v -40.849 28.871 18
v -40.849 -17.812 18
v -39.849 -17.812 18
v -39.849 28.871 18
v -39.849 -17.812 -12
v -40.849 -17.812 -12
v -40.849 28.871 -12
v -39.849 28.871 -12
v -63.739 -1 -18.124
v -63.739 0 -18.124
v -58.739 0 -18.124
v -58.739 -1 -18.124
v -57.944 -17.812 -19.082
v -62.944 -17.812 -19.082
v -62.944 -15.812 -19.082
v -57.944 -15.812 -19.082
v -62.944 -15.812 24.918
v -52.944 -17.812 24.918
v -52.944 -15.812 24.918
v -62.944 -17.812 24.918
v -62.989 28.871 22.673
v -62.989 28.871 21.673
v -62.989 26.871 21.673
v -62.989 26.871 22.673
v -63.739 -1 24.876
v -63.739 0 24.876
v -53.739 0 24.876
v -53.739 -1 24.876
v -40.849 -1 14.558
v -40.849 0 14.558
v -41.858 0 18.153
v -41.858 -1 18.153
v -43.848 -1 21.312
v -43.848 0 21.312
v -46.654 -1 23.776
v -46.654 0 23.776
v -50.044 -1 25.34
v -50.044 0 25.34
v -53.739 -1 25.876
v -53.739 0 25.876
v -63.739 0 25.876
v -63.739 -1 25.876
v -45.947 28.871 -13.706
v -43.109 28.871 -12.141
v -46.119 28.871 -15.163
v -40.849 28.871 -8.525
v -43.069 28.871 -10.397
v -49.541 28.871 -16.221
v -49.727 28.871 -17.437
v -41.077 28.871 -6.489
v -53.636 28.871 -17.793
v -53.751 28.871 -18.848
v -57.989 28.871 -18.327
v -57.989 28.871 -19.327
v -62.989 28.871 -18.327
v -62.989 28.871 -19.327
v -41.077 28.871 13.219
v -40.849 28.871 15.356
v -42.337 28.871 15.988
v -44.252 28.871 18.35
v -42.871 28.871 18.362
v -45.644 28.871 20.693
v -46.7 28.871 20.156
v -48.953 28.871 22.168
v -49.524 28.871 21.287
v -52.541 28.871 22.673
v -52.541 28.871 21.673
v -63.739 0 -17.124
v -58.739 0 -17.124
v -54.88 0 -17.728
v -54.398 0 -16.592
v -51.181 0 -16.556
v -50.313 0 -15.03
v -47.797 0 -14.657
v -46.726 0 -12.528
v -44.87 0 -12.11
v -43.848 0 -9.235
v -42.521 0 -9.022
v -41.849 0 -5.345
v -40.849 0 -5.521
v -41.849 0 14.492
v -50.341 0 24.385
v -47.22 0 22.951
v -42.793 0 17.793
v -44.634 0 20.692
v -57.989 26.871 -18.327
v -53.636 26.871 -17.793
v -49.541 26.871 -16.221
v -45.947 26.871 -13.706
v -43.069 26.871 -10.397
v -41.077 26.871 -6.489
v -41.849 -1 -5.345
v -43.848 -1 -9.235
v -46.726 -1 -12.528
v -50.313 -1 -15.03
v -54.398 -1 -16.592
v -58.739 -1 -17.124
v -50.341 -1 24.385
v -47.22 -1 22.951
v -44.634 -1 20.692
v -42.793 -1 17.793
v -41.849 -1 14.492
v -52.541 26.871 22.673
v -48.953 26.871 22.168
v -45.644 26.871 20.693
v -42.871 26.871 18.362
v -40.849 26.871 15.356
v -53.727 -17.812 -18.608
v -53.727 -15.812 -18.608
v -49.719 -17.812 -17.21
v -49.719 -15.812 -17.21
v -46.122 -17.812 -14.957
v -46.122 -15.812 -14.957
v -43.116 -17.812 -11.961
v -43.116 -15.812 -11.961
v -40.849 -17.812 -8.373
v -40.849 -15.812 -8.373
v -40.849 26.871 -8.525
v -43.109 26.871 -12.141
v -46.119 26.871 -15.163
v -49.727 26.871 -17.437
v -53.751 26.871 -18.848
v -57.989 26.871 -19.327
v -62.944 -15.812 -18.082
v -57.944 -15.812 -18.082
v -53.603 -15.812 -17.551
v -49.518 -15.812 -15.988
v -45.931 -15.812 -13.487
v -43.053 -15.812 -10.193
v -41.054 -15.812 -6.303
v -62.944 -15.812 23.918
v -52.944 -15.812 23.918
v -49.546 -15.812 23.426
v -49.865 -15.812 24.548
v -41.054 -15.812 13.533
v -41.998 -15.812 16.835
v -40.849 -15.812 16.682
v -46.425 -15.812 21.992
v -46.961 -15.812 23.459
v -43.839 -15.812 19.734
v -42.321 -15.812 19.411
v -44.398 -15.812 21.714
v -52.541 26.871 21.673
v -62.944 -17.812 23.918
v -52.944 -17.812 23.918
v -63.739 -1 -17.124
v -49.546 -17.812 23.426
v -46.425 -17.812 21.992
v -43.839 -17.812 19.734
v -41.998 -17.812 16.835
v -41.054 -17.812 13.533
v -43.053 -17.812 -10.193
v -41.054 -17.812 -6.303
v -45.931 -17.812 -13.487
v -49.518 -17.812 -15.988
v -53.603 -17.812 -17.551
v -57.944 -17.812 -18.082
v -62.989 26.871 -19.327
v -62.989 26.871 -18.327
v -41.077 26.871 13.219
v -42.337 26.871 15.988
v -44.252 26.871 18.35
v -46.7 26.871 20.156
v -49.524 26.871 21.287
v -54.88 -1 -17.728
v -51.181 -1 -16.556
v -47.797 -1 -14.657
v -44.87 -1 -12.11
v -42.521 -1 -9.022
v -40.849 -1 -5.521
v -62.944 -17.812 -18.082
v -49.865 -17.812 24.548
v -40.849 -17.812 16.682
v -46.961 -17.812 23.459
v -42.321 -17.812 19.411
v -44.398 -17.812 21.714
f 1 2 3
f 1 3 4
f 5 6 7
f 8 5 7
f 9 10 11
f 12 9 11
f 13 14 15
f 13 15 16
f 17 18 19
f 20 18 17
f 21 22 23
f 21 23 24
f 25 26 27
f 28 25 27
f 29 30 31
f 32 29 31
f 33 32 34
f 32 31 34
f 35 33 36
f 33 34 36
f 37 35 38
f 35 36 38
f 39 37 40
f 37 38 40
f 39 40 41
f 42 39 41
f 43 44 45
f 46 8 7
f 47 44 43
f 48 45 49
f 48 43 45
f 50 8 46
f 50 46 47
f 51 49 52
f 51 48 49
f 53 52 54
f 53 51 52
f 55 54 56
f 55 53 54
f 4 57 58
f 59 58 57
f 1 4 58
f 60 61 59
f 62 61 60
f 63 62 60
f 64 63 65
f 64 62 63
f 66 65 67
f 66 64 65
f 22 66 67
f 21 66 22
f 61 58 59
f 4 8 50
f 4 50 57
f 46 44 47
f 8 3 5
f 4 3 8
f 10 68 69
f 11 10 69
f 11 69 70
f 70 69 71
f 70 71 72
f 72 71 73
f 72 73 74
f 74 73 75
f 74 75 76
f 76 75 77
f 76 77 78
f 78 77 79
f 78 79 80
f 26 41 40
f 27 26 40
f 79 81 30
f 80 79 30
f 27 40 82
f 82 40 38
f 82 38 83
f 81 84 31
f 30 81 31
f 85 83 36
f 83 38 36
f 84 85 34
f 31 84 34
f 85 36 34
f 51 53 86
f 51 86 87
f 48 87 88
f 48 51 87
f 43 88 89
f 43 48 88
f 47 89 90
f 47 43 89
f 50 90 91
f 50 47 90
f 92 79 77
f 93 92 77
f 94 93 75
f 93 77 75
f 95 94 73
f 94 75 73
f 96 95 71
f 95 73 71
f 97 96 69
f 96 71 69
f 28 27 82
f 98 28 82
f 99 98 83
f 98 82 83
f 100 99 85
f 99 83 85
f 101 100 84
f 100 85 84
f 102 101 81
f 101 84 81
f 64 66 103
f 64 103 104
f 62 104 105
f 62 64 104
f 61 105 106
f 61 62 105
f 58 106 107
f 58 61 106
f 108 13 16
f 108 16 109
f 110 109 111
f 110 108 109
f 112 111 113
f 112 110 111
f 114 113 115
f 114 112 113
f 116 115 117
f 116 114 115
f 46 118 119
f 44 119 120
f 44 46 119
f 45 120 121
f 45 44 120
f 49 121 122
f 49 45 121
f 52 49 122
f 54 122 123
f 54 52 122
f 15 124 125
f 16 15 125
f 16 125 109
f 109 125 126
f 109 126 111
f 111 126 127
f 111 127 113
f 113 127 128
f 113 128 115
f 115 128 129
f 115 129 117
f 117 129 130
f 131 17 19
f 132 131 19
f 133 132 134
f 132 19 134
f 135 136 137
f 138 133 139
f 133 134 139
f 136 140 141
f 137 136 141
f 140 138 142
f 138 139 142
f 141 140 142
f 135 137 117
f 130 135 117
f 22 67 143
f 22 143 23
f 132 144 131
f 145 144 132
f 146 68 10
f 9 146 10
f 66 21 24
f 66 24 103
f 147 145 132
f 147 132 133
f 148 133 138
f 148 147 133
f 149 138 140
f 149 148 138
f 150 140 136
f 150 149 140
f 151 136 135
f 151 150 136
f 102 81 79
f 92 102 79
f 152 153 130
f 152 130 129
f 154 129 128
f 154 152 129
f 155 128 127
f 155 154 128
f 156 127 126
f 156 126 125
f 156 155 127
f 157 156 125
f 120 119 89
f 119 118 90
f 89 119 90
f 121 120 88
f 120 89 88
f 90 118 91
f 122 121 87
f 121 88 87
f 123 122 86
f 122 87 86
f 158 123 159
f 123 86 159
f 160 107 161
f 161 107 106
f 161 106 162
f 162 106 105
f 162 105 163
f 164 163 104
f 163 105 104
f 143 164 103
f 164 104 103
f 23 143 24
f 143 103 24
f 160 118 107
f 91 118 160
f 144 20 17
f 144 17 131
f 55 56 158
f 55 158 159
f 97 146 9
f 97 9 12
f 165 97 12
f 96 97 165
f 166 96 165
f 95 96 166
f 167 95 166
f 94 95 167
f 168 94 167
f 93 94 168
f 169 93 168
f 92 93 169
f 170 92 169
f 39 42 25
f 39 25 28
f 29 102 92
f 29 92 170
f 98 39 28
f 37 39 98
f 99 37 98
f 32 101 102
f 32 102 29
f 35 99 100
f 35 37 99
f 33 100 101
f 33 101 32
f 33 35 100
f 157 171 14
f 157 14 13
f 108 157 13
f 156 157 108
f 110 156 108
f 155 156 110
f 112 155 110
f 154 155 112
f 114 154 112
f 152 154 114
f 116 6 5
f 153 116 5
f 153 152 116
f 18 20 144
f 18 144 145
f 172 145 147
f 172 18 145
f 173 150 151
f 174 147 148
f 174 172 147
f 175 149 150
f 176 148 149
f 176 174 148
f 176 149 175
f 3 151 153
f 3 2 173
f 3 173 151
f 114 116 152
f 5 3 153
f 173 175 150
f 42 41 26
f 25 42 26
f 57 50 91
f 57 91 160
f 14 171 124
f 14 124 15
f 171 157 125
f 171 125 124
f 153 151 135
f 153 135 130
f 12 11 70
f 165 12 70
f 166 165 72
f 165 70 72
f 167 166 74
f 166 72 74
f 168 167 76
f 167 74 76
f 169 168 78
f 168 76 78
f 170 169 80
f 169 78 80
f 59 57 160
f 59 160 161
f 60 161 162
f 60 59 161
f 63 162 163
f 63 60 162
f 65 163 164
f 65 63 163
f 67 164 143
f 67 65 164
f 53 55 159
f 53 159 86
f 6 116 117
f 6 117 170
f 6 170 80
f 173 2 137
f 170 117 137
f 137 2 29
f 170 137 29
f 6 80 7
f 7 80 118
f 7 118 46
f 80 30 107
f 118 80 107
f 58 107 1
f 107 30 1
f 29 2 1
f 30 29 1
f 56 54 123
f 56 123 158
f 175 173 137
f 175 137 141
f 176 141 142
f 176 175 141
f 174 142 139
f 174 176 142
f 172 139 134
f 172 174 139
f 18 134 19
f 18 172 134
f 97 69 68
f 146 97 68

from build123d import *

# Parameters (mm, degrees)
F1_DEPTH = 1
F2_W     = 46.682928
F2_H     = 30
F3_DEPTH = 1
F5_DEPTH = 2
F7_DEPTH = 2


with BuildPart() as f1:
    # F0 (on Front) → F1 (new body)
    with BuildSketch(Plane.XZ):
        with BuildLine():
            Line((-63.739401, 25.876286), (-63.739401, 24.876286))
            Line((-63.739401, 24.876286), (-53.739401, 24.876286))
            ThreePointArc((-53.739401, 24.876286), (-45.845818, 21.914612), (-41.848604, 14.49151))
            Line((-41.848604, 14.49151), (-41.848604, -5.344726))
            ThreePointArc((-41.848604, -5.344726), (-48.443242, -13.888168), (-58.739401, -17.123714))
            Line((-58.739401, -17.123714), (-63.739401, -17.123714))
            Line((-63.739401, -17.123714), (-63.739401, -18.123714))
            Line((-63.739401, -18.123714), (-58.739401, -18.123714))
            ThreePointArc((-58.739401, -18.123714), (-47.797274, -14.656578), (-40.848604, -5.520541))
            Line((-40.848604, -5.520541), (-40.848604, 14.55776))
            ThreePointArc((-40.848604, 14.55776), (-45.162081, 22.645092), (-53.739401, 25.876286))
            Line((-53.739401, 25.876286), (-63.739401, 25.876286))
        make_face()
    extrude(amount=F1_DEPTH)

    # F2 (on face) → F3 (join)
    with BuildSketch(Plane.YZ.offset(-40.848604)):
        with Locations((5.529391, 3)):
            Rectangle(F2_W, F2_H)
    extrude(amount=F3_DEPTH)

    # F4 (on face) → F5 (join)
    with BuildSketch(Plane(origin=(0, 28.870855, 0), x_dir=(-1, 0, 0), z_dir=(0, 1, 0))):
        with BuildLine():
            Line((62.989129, 21.67293), (62.989129, 22.67293))
            Line((62.989129, 22.67293), (52.540804, 22.67293))
            ThreePointArc((52.540804, 22.67293), (44.763407, 20.089843), (40.076731, 13.367097))
            Line((40.076731, 13.367097), (40.076731, -6.663155))
            ThreePointArc((40.076731, -6.663155), (47.020666, -15.841348), (57.989129, -19.32707))
            Line((57.989129, -19.32707), (62.989129, -19.32707))
            Line((62.989129, -19.32707), (62.989129, -18.32707))
            Line((62.989129, -18.32707), (57.989129, -18.32707))
            ThreePointArc((57.989129, -18.32707), (47.667229, -15.073541), (41.076731, -6.489113))
            Line((41.076731, -6.489113), (41.076731, 13.219057))
            ThreePointArc((41.076731, 13.219057), (45.418779, 19.330919), (52.540804, 21.67293))
            Line((52.540804, 21.67293), (62.989129, 21.67293))
        make_face()
    extrude(amount=-F5_DEPTH)

    # F6 (on face) → F7 (join)
    with BuildSketch(Plane.XZ.offset(17.812073)):
        with BuildLine():
            Line((-62.944316, 24.917709), (-62.944316, 23.917709))
            Line((-62.944316, 23.917709), (-52.944316, 23.917709))
            ThreePointArc((-52.944316, 23.917709), (-45.050733, 20.956036), (-41.053519, 13.532934))
            Line((-41.053519, 13.532934), (-41.053519, -6.303302))
            ThreePointArc((-41.053519, -6.303302), (-47.648157, -14.846744), (-57.944316, -18.082291))
            Line((-57.944316, -18.082291), (-62.944316, -18.082291))
            Line((-62.944316, -18.082291), (-62.944316, -19.082291))
            Line((-62.944316, -19.082291), (-57.944316, -19.082291))
            ThreePointArc((-57.944316, -19.082291), (-47.002189, -15.615154), (-40.053519, -6.479117))
            Line((-40.053519, -6.479117), (-40.053519, 13.599184))
            ThreePointArc((-40.053519, 13.599184), (-44.366996, 21.686516), (-52.944316, 24.917709))
            Line((-52.944316, 24.917709), (-62.944316, 24.917709))
        make_face()
    extrude(amount=-F7_DEPTH)


solid = f1.part
